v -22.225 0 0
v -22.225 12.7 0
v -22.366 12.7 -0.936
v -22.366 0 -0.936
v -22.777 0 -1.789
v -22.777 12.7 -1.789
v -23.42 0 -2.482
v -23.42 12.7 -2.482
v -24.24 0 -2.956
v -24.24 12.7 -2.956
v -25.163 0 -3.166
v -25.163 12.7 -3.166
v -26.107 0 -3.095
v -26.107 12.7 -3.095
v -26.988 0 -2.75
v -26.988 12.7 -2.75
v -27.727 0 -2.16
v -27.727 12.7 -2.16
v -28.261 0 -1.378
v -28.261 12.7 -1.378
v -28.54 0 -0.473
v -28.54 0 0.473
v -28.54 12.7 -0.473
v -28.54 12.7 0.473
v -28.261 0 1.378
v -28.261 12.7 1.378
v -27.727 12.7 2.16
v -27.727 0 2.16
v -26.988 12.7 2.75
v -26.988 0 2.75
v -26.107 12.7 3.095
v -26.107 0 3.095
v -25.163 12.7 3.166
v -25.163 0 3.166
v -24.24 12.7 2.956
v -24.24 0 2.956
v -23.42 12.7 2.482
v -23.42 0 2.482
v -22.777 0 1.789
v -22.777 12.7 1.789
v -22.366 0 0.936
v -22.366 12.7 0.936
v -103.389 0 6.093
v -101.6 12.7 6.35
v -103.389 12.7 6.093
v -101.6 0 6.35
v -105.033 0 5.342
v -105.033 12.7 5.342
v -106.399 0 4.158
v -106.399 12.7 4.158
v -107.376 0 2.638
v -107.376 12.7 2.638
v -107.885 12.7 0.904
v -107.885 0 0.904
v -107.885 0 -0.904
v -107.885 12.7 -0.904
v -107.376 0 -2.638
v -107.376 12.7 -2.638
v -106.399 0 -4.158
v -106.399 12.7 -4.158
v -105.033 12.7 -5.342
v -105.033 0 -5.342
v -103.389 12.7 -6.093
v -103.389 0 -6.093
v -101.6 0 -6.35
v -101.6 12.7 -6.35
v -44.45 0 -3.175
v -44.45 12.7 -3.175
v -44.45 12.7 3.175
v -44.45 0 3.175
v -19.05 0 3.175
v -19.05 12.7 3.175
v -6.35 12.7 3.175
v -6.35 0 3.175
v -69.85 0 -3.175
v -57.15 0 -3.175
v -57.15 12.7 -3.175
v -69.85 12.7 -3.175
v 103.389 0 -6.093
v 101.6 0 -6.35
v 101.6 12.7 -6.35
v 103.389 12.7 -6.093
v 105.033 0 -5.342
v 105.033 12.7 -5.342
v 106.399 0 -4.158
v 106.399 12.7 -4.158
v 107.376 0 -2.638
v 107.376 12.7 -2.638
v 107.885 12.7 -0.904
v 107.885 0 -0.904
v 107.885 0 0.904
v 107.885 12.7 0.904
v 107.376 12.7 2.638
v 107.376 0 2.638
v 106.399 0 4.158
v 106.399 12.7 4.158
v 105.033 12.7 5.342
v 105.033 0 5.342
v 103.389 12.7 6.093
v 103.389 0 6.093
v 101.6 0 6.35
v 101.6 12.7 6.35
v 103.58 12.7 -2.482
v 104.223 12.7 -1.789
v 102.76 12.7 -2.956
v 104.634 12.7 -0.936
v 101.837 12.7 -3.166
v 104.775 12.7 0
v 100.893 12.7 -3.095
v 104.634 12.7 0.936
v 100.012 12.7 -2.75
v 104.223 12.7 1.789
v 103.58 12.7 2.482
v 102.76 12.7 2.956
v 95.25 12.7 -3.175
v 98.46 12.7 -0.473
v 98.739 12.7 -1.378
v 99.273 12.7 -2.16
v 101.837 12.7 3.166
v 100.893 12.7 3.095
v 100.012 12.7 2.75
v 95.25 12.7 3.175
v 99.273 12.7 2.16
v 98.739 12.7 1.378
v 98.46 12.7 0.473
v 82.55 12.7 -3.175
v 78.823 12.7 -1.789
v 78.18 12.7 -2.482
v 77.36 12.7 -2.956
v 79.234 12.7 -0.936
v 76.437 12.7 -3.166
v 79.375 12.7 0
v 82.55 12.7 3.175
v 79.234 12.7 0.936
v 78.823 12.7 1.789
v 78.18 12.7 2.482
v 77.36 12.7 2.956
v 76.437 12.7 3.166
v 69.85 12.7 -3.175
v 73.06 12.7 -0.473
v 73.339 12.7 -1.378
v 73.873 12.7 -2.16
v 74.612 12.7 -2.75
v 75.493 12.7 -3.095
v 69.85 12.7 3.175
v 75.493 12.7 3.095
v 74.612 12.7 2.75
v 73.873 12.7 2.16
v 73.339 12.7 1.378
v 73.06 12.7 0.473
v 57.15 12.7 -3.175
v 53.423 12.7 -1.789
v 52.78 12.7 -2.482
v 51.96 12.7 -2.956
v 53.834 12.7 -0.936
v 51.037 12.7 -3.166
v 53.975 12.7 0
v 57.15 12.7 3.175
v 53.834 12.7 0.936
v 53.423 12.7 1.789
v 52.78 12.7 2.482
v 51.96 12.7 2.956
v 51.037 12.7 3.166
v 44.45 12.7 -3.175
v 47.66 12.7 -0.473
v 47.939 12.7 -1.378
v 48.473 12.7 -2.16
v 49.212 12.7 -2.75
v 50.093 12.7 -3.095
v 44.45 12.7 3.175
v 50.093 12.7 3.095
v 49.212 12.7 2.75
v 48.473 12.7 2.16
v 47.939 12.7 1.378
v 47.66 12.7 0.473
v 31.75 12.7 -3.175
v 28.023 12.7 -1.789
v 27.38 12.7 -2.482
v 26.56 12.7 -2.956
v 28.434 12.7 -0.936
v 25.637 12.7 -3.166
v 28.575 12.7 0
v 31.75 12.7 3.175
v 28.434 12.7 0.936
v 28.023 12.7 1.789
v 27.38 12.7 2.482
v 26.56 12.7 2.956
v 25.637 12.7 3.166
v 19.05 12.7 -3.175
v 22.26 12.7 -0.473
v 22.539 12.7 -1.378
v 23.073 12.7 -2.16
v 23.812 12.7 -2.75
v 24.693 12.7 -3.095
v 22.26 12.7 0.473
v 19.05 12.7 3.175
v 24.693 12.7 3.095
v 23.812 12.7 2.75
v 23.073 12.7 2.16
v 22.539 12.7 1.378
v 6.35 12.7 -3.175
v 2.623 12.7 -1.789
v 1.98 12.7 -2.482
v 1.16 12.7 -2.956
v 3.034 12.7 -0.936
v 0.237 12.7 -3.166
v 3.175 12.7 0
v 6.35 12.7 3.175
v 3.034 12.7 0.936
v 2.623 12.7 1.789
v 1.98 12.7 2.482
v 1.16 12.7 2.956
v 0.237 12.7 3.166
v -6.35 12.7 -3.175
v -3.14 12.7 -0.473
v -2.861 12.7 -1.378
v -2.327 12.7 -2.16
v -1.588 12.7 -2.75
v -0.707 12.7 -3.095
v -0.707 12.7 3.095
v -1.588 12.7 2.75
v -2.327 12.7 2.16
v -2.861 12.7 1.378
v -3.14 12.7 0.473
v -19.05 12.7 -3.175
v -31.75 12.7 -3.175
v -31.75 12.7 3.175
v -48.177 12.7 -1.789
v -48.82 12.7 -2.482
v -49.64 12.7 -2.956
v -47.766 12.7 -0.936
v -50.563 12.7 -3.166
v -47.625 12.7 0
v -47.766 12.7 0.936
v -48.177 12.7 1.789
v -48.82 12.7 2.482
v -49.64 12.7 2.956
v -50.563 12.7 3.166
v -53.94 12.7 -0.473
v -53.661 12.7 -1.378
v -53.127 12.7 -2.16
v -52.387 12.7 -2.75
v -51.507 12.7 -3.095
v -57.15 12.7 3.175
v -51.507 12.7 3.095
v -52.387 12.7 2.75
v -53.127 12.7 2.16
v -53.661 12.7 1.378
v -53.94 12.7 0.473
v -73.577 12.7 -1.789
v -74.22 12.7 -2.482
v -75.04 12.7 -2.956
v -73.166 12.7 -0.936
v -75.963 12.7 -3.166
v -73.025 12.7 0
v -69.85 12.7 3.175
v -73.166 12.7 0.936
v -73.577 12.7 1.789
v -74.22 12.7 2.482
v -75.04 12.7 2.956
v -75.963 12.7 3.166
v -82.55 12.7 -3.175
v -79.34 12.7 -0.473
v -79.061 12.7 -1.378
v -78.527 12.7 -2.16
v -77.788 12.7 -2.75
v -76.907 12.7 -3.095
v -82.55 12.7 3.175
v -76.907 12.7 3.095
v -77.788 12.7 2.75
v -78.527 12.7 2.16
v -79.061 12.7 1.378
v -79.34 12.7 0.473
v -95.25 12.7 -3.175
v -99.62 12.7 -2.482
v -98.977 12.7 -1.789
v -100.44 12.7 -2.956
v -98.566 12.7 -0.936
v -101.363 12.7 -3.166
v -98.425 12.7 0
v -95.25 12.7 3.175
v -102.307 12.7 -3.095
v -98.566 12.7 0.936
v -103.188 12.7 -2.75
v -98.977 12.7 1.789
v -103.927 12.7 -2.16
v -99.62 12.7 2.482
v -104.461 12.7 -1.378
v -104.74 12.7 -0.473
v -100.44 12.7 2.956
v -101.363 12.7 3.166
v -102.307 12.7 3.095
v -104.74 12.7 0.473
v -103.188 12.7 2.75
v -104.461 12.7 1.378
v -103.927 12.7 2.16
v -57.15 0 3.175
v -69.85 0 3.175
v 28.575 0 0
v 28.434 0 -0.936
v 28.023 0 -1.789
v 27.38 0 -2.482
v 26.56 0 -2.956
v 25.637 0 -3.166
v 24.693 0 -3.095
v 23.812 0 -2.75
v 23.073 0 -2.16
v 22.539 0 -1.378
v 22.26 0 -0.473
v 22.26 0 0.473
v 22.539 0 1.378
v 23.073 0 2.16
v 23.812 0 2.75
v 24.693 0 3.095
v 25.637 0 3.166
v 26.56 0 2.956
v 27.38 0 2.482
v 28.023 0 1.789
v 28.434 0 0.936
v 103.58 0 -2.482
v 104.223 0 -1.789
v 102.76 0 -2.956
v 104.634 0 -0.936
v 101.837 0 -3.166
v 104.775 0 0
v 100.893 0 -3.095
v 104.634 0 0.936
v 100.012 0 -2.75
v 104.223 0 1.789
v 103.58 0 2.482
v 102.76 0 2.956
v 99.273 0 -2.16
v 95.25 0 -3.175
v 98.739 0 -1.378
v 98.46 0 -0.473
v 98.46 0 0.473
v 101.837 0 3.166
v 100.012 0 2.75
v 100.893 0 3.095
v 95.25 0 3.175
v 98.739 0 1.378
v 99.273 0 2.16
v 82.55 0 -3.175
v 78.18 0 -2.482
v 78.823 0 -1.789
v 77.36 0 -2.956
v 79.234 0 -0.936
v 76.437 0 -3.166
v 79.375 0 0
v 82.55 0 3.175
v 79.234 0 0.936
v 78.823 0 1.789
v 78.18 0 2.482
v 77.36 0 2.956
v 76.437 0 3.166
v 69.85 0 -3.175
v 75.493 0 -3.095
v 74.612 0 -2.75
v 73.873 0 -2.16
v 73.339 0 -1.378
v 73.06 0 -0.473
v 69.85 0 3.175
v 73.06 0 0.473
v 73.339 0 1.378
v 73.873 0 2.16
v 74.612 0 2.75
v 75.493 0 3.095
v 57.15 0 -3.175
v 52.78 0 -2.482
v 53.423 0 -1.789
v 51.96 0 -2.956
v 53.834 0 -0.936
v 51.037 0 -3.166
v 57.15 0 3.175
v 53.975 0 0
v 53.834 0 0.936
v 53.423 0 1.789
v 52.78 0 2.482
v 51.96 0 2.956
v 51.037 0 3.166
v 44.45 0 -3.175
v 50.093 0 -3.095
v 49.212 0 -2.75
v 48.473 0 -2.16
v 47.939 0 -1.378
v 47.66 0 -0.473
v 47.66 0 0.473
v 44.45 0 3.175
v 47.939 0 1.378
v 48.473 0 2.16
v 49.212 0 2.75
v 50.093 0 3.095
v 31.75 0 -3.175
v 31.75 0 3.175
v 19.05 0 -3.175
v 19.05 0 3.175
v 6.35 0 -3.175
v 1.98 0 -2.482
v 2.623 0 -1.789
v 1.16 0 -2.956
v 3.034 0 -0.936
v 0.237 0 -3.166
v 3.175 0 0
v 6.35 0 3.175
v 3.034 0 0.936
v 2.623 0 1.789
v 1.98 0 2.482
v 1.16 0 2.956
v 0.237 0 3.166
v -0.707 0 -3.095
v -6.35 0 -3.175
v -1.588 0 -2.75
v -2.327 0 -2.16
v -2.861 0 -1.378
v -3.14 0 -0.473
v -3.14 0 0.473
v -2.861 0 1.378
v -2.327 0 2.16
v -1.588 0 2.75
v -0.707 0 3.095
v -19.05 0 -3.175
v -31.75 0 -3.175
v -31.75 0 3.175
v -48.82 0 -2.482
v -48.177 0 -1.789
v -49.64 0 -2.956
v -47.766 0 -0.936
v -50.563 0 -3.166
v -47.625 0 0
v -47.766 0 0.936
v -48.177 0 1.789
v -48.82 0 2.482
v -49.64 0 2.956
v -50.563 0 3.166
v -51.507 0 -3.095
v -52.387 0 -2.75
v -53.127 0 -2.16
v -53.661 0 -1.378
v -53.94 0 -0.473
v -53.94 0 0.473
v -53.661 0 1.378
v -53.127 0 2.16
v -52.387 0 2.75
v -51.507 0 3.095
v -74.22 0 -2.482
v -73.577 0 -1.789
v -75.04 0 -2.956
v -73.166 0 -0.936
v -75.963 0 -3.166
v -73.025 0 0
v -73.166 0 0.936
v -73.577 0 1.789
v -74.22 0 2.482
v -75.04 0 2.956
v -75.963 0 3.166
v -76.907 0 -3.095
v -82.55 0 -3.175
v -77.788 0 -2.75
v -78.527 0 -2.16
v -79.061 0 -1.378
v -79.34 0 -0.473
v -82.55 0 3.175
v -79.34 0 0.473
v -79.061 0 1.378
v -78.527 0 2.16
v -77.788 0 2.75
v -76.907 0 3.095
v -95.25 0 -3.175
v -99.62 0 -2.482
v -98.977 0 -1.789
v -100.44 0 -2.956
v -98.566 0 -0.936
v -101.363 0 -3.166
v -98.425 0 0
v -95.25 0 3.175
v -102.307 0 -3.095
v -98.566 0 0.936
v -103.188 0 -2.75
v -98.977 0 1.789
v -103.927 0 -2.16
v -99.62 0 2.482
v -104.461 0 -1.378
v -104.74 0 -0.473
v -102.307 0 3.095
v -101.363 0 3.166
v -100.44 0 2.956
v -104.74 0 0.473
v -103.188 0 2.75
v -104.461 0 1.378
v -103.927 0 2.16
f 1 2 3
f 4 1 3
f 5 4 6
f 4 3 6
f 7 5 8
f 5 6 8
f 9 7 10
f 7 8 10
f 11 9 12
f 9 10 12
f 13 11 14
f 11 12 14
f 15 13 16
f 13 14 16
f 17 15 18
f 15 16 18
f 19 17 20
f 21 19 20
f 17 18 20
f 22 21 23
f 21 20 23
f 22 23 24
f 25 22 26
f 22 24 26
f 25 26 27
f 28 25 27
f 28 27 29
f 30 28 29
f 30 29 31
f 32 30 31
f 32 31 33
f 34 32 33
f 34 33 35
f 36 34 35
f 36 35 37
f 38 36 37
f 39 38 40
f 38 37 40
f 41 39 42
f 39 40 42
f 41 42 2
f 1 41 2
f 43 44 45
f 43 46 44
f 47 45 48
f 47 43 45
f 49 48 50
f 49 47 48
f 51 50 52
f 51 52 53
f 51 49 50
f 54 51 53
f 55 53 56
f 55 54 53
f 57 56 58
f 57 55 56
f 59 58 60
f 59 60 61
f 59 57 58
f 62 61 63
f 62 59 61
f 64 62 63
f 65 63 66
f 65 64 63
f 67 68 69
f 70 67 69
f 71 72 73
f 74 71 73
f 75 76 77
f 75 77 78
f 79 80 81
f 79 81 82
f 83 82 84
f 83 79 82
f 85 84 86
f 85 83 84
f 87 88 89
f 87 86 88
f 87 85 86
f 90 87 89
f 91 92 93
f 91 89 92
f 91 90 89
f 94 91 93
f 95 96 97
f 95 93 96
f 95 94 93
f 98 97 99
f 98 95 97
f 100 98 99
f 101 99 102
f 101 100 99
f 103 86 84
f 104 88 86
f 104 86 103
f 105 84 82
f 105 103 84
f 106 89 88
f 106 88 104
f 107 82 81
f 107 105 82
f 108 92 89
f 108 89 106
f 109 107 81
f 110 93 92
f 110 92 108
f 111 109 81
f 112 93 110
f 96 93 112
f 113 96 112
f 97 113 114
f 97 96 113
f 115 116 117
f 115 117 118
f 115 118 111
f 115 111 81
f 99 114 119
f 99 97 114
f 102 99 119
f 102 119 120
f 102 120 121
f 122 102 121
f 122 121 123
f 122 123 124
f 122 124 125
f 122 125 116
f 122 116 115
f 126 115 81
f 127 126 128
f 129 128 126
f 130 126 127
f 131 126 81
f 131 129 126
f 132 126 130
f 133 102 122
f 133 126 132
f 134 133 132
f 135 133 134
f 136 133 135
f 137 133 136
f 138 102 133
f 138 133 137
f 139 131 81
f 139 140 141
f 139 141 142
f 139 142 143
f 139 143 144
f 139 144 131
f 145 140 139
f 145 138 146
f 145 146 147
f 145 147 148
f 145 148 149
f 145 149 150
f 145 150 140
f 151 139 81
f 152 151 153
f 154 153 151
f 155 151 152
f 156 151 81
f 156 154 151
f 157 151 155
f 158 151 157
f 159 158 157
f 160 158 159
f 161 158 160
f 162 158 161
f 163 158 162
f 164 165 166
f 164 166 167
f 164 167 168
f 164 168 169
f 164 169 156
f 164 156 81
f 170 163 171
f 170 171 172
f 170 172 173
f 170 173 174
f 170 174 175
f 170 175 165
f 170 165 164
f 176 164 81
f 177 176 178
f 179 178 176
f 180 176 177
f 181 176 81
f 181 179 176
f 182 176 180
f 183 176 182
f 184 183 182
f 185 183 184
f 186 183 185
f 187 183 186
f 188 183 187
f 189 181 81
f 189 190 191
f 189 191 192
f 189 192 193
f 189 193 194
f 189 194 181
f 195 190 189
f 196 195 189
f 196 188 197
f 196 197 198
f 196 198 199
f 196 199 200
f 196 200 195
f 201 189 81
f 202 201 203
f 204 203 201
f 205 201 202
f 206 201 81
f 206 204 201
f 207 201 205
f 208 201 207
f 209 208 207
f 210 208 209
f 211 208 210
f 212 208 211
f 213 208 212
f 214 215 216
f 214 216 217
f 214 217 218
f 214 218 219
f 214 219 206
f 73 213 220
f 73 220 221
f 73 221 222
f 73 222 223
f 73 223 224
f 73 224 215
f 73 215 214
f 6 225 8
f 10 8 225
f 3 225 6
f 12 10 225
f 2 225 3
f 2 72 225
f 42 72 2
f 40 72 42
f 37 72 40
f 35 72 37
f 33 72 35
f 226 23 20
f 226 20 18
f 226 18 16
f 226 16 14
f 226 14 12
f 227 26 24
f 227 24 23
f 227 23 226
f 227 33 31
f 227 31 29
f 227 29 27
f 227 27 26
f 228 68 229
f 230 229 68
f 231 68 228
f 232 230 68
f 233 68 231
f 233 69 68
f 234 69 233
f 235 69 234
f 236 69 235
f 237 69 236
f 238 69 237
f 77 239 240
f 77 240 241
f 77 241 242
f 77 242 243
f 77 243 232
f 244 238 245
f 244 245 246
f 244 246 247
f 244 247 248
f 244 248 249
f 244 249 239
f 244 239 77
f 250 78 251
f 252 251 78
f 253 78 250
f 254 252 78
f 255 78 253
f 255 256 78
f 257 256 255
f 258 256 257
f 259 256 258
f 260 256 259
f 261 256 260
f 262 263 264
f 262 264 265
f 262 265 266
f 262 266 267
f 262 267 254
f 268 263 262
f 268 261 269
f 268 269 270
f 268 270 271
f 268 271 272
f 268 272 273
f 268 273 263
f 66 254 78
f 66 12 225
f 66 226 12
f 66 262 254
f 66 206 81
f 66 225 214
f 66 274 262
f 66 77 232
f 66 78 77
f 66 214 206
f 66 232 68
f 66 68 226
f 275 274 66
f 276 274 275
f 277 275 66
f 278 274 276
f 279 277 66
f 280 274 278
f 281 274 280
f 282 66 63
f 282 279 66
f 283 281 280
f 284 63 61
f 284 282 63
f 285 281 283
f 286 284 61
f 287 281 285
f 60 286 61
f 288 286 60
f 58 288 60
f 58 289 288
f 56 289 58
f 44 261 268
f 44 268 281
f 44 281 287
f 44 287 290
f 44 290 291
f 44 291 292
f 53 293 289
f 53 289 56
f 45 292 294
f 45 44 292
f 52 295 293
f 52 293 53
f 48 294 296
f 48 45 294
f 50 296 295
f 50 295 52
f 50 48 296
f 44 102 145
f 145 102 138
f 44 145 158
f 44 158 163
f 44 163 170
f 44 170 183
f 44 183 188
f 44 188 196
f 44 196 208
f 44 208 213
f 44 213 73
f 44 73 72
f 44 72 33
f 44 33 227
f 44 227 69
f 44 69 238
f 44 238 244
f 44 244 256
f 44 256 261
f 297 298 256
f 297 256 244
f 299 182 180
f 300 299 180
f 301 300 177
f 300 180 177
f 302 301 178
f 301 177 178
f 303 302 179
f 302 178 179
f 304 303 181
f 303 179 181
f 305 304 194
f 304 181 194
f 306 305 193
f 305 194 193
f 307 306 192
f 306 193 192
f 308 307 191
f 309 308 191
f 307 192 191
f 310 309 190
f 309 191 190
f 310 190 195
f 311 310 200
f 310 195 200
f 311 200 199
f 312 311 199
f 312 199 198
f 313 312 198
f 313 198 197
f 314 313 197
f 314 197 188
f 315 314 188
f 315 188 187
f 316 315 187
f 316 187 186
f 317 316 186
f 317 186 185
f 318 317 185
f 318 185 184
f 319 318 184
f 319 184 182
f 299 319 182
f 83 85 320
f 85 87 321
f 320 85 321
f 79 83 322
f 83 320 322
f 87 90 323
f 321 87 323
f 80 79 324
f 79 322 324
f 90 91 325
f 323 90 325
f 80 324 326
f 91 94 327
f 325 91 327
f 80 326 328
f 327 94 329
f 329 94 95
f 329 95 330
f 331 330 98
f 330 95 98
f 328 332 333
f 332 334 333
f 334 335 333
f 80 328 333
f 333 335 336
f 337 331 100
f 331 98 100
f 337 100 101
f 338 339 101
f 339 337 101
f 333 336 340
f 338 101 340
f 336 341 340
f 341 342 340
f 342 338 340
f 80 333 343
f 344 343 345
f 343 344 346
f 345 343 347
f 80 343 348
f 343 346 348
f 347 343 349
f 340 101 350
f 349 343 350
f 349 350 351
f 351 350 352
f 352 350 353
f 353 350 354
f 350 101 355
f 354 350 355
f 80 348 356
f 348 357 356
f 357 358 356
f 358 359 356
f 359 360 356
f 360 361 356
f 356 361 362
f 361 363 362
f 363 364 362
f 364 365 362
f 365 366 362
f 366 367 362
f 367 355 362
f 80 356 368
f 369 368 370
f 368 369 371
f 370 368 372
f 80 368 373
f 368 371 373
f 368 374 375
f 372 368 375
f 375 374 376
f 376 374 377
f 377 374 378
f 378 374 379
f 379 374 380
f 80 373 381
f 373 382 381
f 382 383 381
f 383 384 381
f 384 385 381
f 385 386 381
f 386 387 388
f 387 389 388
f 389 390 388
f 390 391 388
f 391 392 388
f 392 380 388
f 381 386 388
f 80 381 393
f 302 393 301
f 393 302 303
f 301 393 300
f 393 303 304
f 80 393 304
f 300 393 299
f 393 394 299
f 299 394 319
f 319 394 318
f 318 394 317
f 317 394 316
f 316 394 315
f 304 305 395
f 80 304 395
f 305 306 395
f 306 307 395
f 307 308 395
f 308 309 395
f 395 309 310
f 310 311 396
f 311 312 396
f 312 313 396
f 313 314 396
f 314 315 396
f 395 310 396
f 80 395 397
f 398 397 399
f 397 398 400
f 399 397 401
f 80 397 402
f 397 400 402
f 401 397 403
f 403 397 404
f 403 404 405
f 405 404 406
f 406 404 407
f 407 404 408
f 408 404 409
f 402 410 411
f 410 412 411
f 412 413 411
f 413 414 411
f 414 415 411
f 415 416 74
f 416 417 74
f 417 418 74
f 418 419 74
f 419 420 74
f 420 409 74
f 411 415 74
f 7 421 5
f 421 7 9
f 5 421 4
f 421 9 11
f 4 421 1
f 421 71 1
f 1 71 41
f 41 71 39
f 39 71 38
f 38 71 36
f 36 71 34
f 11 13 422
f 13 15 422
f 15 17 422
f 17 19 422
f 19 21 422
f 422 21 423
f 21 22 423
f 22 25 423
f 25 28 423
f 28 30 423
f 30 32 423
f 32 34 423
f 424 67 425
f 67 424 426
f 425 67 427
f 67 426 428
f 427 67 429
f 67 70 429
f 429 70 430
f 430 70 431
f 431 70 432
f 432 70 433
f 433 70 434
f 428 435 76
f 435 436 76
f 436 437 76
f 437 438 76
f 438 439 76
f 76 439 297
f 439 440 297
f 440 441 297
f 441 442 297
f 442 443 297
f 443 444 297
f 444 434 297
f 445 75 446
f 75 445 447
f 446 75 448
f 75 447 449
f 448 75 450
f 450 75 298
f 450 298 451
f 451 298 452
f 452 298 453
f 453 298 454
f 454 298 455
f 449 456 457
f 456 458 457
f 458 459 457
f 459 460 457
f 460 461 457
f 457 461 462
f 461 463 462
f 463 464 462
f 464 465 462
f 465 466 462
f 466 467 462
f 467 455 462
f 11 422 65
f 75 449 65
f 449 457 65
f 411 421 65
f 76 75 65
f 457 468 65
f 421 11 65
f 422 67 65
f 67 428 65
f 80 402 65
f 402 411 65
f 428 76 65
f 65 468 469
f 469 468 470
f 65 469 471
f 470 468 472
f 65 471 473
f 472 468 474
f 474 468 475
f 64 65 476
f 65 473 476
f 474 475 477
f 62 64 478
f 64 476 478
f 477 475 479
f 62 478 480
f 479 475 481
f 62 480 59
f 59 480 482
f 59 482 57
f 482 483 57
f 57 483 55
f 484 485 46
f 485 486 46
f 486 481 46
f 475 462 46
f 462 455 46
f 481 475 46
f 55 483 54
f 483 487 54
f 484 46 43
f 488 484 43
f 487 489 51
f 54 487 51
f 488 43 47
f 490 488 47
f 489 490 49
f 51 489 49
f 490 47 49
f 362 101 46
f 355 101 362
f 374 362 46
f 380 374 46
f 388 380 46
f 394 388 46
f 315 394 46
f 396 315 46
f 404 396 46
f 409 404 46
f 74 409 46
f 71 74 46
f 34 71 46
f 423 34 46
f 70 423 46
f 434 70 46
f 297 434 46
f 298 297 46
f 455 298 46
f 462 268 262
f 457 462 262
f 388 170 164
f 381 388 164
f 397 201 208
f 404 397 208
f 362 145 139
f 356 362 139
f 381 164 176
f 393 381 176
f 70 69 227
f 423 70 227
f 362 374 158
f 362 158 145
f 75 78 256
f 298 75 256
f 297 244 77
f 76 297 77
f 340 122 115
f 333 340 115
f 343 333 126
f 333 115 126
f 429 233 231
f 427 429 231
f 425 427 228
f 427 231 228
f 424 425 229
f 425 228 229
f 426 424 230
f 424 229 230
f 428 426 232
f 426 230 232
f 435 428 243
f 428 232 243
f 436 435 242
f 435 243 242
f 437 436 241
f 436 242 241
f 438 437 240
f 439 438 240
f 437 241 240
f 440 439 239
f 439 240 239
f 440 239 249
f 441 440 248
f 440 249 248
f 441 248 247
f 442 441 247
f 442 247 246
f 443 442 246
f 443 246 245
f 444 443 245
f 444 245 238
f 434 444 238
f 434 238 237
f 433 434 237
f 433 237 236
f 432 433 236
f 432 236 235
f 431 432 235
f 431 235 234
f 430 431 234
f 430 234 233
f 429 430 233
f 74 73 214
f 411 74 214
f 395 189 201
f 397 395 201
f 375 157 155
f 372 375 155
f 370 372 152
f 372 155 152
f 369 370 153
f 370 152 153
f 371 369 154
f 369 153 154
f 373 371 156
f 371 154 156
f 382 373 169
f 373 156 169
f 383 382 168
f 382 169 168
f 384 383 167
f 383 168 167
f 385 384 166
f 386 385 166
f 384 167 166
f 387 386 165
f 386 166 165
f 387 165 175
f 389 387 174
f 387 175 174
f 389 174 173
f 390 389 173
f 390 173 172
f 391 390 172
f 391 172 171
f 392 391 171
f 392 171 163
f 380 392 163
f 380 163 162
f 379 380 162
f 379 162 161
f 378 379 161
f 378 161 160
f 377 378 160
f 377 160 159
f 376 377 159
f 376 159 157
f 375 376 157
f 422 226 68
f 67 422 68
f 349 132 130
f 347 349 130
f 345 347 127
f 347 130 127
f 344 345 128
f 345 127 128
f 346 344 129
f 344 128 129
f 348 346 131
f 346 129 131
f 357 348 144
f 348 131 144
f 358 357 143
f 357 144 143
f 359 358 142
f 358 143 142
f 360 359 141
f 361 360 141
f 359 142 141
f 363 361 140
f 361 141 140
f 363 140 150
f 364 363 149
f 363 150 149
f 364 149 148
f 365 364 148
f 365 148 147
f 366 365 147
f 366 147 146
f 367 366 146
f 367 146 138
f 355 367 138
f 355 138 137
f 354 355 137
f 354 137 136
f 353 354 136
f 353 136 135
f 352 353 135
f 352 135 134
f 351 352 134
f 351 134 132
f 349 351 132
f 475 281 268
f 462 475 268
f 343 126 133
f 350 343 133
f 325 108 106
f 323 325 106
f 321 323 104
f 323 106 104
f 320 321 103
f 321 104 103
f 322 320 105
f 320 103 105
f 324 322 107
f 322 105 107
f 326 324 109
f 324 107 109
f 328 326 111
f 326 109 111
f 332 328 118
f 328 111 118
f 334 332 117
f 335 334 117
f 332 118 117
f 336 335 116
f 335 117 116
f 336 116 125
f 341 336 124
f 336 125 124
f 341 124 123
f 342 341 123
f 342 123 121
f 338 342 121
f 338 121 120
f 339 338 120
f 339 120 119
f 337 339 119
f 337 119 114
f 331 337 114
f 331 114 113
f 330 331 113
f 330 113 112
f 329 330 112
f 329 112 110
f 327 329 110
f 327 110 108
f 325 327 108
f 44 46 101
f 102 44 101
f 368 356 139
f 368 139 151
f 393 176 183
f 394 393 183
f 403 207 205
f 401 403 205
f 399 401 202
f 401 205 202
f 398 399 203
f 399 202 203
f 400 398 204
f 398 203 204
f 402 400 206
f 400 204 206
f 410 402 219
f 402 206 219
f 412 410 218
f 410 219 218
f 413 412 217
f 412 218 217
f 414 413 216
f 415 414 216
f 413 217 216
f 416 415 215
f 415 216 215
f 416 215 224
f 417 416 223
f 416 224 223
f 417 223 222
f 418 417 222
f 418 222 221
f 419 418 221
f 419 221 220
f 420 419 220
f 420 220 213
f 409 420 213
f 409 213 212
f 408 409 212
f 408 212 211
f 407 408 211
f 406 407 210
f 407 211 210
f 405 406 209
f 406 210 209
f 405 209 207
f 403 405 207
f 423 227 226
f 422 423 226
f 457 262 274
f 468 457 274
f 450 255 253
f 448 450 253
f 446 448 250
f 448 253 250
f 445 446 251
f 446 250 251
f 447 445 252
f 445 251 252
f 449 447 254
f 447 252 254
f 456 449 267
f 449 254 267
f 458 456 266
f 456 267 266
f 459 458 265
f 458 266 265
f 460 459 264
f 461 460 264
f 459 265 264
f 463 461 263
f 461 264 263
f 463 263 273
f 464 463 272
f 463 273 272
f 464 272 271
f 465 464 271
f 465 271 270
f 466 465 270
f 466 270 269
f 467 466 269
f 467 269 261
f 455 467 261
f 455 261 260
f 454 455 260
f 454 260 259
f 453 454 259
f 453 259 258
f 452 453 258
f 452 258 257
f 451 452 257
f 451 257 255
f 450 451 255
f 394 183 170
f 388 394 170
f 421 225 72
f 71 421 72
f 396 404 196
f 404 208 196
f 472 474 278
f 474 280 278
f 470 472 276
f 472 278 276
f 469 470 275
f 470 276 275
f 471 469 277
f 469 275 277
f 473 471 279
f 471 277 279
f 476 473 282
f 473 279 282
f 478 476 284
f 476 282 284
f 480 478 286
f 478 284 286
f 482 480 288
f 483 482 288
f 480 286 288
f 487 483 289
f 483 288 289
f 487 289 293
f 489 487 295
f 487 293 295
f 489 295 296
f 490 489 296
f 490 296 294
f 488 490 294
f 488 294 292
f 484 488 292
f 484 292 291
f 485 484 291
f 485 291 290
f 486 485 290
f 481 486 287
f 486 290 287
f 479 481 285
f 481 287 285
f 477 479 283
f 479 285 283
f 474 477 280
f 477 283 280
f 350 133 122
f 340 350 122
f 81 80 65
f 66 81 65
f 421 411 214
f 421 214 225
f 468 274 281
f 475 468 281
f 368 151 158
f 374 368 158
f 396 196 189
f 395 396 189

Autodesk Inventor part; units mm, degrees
ref_plane "YZ Plane" through (0, 0, 0) normal (1, 0, 0) x (0, 1, 0)
ref_plane "XZ Plane" through (0, 0, 0) normal (0, 1, 0) x (-1, 0, 0)
ref_plane "XY Plane" through (0, 0, 0) normal (0, 0, 1) x (1, 0, 0)
sketch "Sketch1" plane through (0, 0, 0) normal (0, 1, 0) x (-1, 0, 0)
  line L0 (101.6, 6.35) -> (-101.6, 6.35)
  line L1 (-101.6, -6.35) -> (101.6, -6.35)
  arc A0 (101.6, -6.35) -> (101.6, 6.35) centre (101.6, 0) ccw
  arc A1 (-101.6, 6.35) -> (-101.6, -6.35) centre (-101.6, 0) ccw
  line L2 (151.13, 0) -> (-151.13, 0) projected
  line L3 (0, -8.89) -> (0, 8.89) projected
  point P0 (0, 0)
  dimension "d2" = 203.2
  dimension "d3" = 6.35
  dimension "d4" = 6.35
  dimension "d5" = 101.6
  dimension "d6" = 0
  dimension "d7" = 12.7
  dimension "d9" = 6.35
  dimension "d37" = 203.2
extrude "Extrusion1" add sketch "Sketch1" along normal blind 12.7
sketch "Sketch4" plane through (0, 12.7, 0) normal (0, 1, 0) x (1, 0, 0)
  circle A0 centre (-101.6, 0) radius 3.175
  line L0 (-151.13, 0) -> (151.13, 0) projected
  line L1 (0, 8.89) -> (0, -8.89) projected
  circle A1 centre (-76.2, 0) radius 3.175
  circle A2 centre (-50.8, 0) radius 3.175
  circle A3 centre (-25.4, 0) radius 3.175
  circle A4 centre (0, 0) radius 3.175
  circle A5 centre (25.4, 0) radius 3.175
  circle A6 centre (50.8, 0) radius 3.175
  circle A7 centre (76.2, 0) radius 3.175
  circle A8 centre (101.6, 0) radius 3.175
  dimension "d45" = 6.35
  dimension "d46" = 101.6
  dimension "d47" = 0
  dimension "d50" = 25.4
extrude "Extrusion4" cut sketch "Sketch4" against normal through all
sketch "Sketch5" plane through (0, 12.7, 0) normal (0, 1, 0) x (1, 0, 0)
  line L0 (-95.25, -3.175) -> (-82.55, -3.175)
  line L1 (-82.55, -3.175) -> (-82.55, 3.175)
  line L2 (-82.55, 3.175) -> (-95.25, 3.175)
  line L3 (-95.25, 3.175) -> (-95.25, -3.175)
  line L4 (-151.13, 0) -> (151.13, 0) projected
  line L5 (0, 13.6448) -> (0, -37.419) projected
  line L6 (-57.15, 3.175) -> (-69.85, 3.175)
  line L7 (-69.85, 3.175) -> (-69.85, -3.175)
  line L8 (-69.85, -3.175) -> (-57.15, -3.175)
  line L9 (-57.15, -3.175) -> (-57.15, 3.175)
  line L10 (-31.75, 3.175) -> (-44.45, 3.175)
  line L11 (-44.45, 3.175) -> (-44.45, -3.175)
  line L12 (-44.45, -3.175) -> (-31.75, -3.175)
  line L13 (-31.75, -3.175) -> (-31.75, 3.175)
  line L14 (-6.35, 3.175) -> (-19.05, 3.175)
  line L15 (-19.05, 3.175) -> (-19.05, -3.175)
  line L16 (-19.05, -3.175) -> (-6.35, -3.175)
  line L17 (-6.35, -3.175) -> (-6.35, 3.175)
  line L18 (19.05, 3.175) -> (6.35, 3.175)
  line L19 (6.35, 3.175) -> (6.35, -3.175)
  line L20 (6.35, -3.175) -> (19.05, -3.175)
  line L21 (19.05, -3.175) -> (19.05, 3.175)
  line L22 (44.45, 3.175) -> (31.75, 3.175)
  line L23 (31.75, 3.175) -> (31.75, -3.175)
  line L24 (31.75, -3.175) -> (44.45, -3.175)
  line L25 (44.45, -3.175) -> (44.45, 3.175)
  line L26 (69.85, 3.175) -> (57.15, 3.175)
  line L27 (57.15, 3.175) -> (57.15, -3.175)
  line L28 (57.15, -3.175) -> (69.85, -3.175)
  line L29 (69.85, -3.175) -> (69.85, 3.175)
  line L30 (95.25, 3.175) -> (82.55, 3.175)
  line L31 (82.55, 3.175) -> (82.55, -3.175)
  line L32 (82.55, -3.175) -> (95.25, -3.175)
  line L33 (95.25, -3.175) -> (95.25, 3.175)
  point P0 (0, 0)
  dimension "d57" = 12.7
  dimension "d58" = 6.35
  dimension "d59" = 82.55
  dimension "d60" = 3.175
  dimension "d63" = 25.4
extrude "Extrusion5" cut sketch "Sketch5" against normal through all
properties part number "8M Module" material "Wood (Cherry)"
